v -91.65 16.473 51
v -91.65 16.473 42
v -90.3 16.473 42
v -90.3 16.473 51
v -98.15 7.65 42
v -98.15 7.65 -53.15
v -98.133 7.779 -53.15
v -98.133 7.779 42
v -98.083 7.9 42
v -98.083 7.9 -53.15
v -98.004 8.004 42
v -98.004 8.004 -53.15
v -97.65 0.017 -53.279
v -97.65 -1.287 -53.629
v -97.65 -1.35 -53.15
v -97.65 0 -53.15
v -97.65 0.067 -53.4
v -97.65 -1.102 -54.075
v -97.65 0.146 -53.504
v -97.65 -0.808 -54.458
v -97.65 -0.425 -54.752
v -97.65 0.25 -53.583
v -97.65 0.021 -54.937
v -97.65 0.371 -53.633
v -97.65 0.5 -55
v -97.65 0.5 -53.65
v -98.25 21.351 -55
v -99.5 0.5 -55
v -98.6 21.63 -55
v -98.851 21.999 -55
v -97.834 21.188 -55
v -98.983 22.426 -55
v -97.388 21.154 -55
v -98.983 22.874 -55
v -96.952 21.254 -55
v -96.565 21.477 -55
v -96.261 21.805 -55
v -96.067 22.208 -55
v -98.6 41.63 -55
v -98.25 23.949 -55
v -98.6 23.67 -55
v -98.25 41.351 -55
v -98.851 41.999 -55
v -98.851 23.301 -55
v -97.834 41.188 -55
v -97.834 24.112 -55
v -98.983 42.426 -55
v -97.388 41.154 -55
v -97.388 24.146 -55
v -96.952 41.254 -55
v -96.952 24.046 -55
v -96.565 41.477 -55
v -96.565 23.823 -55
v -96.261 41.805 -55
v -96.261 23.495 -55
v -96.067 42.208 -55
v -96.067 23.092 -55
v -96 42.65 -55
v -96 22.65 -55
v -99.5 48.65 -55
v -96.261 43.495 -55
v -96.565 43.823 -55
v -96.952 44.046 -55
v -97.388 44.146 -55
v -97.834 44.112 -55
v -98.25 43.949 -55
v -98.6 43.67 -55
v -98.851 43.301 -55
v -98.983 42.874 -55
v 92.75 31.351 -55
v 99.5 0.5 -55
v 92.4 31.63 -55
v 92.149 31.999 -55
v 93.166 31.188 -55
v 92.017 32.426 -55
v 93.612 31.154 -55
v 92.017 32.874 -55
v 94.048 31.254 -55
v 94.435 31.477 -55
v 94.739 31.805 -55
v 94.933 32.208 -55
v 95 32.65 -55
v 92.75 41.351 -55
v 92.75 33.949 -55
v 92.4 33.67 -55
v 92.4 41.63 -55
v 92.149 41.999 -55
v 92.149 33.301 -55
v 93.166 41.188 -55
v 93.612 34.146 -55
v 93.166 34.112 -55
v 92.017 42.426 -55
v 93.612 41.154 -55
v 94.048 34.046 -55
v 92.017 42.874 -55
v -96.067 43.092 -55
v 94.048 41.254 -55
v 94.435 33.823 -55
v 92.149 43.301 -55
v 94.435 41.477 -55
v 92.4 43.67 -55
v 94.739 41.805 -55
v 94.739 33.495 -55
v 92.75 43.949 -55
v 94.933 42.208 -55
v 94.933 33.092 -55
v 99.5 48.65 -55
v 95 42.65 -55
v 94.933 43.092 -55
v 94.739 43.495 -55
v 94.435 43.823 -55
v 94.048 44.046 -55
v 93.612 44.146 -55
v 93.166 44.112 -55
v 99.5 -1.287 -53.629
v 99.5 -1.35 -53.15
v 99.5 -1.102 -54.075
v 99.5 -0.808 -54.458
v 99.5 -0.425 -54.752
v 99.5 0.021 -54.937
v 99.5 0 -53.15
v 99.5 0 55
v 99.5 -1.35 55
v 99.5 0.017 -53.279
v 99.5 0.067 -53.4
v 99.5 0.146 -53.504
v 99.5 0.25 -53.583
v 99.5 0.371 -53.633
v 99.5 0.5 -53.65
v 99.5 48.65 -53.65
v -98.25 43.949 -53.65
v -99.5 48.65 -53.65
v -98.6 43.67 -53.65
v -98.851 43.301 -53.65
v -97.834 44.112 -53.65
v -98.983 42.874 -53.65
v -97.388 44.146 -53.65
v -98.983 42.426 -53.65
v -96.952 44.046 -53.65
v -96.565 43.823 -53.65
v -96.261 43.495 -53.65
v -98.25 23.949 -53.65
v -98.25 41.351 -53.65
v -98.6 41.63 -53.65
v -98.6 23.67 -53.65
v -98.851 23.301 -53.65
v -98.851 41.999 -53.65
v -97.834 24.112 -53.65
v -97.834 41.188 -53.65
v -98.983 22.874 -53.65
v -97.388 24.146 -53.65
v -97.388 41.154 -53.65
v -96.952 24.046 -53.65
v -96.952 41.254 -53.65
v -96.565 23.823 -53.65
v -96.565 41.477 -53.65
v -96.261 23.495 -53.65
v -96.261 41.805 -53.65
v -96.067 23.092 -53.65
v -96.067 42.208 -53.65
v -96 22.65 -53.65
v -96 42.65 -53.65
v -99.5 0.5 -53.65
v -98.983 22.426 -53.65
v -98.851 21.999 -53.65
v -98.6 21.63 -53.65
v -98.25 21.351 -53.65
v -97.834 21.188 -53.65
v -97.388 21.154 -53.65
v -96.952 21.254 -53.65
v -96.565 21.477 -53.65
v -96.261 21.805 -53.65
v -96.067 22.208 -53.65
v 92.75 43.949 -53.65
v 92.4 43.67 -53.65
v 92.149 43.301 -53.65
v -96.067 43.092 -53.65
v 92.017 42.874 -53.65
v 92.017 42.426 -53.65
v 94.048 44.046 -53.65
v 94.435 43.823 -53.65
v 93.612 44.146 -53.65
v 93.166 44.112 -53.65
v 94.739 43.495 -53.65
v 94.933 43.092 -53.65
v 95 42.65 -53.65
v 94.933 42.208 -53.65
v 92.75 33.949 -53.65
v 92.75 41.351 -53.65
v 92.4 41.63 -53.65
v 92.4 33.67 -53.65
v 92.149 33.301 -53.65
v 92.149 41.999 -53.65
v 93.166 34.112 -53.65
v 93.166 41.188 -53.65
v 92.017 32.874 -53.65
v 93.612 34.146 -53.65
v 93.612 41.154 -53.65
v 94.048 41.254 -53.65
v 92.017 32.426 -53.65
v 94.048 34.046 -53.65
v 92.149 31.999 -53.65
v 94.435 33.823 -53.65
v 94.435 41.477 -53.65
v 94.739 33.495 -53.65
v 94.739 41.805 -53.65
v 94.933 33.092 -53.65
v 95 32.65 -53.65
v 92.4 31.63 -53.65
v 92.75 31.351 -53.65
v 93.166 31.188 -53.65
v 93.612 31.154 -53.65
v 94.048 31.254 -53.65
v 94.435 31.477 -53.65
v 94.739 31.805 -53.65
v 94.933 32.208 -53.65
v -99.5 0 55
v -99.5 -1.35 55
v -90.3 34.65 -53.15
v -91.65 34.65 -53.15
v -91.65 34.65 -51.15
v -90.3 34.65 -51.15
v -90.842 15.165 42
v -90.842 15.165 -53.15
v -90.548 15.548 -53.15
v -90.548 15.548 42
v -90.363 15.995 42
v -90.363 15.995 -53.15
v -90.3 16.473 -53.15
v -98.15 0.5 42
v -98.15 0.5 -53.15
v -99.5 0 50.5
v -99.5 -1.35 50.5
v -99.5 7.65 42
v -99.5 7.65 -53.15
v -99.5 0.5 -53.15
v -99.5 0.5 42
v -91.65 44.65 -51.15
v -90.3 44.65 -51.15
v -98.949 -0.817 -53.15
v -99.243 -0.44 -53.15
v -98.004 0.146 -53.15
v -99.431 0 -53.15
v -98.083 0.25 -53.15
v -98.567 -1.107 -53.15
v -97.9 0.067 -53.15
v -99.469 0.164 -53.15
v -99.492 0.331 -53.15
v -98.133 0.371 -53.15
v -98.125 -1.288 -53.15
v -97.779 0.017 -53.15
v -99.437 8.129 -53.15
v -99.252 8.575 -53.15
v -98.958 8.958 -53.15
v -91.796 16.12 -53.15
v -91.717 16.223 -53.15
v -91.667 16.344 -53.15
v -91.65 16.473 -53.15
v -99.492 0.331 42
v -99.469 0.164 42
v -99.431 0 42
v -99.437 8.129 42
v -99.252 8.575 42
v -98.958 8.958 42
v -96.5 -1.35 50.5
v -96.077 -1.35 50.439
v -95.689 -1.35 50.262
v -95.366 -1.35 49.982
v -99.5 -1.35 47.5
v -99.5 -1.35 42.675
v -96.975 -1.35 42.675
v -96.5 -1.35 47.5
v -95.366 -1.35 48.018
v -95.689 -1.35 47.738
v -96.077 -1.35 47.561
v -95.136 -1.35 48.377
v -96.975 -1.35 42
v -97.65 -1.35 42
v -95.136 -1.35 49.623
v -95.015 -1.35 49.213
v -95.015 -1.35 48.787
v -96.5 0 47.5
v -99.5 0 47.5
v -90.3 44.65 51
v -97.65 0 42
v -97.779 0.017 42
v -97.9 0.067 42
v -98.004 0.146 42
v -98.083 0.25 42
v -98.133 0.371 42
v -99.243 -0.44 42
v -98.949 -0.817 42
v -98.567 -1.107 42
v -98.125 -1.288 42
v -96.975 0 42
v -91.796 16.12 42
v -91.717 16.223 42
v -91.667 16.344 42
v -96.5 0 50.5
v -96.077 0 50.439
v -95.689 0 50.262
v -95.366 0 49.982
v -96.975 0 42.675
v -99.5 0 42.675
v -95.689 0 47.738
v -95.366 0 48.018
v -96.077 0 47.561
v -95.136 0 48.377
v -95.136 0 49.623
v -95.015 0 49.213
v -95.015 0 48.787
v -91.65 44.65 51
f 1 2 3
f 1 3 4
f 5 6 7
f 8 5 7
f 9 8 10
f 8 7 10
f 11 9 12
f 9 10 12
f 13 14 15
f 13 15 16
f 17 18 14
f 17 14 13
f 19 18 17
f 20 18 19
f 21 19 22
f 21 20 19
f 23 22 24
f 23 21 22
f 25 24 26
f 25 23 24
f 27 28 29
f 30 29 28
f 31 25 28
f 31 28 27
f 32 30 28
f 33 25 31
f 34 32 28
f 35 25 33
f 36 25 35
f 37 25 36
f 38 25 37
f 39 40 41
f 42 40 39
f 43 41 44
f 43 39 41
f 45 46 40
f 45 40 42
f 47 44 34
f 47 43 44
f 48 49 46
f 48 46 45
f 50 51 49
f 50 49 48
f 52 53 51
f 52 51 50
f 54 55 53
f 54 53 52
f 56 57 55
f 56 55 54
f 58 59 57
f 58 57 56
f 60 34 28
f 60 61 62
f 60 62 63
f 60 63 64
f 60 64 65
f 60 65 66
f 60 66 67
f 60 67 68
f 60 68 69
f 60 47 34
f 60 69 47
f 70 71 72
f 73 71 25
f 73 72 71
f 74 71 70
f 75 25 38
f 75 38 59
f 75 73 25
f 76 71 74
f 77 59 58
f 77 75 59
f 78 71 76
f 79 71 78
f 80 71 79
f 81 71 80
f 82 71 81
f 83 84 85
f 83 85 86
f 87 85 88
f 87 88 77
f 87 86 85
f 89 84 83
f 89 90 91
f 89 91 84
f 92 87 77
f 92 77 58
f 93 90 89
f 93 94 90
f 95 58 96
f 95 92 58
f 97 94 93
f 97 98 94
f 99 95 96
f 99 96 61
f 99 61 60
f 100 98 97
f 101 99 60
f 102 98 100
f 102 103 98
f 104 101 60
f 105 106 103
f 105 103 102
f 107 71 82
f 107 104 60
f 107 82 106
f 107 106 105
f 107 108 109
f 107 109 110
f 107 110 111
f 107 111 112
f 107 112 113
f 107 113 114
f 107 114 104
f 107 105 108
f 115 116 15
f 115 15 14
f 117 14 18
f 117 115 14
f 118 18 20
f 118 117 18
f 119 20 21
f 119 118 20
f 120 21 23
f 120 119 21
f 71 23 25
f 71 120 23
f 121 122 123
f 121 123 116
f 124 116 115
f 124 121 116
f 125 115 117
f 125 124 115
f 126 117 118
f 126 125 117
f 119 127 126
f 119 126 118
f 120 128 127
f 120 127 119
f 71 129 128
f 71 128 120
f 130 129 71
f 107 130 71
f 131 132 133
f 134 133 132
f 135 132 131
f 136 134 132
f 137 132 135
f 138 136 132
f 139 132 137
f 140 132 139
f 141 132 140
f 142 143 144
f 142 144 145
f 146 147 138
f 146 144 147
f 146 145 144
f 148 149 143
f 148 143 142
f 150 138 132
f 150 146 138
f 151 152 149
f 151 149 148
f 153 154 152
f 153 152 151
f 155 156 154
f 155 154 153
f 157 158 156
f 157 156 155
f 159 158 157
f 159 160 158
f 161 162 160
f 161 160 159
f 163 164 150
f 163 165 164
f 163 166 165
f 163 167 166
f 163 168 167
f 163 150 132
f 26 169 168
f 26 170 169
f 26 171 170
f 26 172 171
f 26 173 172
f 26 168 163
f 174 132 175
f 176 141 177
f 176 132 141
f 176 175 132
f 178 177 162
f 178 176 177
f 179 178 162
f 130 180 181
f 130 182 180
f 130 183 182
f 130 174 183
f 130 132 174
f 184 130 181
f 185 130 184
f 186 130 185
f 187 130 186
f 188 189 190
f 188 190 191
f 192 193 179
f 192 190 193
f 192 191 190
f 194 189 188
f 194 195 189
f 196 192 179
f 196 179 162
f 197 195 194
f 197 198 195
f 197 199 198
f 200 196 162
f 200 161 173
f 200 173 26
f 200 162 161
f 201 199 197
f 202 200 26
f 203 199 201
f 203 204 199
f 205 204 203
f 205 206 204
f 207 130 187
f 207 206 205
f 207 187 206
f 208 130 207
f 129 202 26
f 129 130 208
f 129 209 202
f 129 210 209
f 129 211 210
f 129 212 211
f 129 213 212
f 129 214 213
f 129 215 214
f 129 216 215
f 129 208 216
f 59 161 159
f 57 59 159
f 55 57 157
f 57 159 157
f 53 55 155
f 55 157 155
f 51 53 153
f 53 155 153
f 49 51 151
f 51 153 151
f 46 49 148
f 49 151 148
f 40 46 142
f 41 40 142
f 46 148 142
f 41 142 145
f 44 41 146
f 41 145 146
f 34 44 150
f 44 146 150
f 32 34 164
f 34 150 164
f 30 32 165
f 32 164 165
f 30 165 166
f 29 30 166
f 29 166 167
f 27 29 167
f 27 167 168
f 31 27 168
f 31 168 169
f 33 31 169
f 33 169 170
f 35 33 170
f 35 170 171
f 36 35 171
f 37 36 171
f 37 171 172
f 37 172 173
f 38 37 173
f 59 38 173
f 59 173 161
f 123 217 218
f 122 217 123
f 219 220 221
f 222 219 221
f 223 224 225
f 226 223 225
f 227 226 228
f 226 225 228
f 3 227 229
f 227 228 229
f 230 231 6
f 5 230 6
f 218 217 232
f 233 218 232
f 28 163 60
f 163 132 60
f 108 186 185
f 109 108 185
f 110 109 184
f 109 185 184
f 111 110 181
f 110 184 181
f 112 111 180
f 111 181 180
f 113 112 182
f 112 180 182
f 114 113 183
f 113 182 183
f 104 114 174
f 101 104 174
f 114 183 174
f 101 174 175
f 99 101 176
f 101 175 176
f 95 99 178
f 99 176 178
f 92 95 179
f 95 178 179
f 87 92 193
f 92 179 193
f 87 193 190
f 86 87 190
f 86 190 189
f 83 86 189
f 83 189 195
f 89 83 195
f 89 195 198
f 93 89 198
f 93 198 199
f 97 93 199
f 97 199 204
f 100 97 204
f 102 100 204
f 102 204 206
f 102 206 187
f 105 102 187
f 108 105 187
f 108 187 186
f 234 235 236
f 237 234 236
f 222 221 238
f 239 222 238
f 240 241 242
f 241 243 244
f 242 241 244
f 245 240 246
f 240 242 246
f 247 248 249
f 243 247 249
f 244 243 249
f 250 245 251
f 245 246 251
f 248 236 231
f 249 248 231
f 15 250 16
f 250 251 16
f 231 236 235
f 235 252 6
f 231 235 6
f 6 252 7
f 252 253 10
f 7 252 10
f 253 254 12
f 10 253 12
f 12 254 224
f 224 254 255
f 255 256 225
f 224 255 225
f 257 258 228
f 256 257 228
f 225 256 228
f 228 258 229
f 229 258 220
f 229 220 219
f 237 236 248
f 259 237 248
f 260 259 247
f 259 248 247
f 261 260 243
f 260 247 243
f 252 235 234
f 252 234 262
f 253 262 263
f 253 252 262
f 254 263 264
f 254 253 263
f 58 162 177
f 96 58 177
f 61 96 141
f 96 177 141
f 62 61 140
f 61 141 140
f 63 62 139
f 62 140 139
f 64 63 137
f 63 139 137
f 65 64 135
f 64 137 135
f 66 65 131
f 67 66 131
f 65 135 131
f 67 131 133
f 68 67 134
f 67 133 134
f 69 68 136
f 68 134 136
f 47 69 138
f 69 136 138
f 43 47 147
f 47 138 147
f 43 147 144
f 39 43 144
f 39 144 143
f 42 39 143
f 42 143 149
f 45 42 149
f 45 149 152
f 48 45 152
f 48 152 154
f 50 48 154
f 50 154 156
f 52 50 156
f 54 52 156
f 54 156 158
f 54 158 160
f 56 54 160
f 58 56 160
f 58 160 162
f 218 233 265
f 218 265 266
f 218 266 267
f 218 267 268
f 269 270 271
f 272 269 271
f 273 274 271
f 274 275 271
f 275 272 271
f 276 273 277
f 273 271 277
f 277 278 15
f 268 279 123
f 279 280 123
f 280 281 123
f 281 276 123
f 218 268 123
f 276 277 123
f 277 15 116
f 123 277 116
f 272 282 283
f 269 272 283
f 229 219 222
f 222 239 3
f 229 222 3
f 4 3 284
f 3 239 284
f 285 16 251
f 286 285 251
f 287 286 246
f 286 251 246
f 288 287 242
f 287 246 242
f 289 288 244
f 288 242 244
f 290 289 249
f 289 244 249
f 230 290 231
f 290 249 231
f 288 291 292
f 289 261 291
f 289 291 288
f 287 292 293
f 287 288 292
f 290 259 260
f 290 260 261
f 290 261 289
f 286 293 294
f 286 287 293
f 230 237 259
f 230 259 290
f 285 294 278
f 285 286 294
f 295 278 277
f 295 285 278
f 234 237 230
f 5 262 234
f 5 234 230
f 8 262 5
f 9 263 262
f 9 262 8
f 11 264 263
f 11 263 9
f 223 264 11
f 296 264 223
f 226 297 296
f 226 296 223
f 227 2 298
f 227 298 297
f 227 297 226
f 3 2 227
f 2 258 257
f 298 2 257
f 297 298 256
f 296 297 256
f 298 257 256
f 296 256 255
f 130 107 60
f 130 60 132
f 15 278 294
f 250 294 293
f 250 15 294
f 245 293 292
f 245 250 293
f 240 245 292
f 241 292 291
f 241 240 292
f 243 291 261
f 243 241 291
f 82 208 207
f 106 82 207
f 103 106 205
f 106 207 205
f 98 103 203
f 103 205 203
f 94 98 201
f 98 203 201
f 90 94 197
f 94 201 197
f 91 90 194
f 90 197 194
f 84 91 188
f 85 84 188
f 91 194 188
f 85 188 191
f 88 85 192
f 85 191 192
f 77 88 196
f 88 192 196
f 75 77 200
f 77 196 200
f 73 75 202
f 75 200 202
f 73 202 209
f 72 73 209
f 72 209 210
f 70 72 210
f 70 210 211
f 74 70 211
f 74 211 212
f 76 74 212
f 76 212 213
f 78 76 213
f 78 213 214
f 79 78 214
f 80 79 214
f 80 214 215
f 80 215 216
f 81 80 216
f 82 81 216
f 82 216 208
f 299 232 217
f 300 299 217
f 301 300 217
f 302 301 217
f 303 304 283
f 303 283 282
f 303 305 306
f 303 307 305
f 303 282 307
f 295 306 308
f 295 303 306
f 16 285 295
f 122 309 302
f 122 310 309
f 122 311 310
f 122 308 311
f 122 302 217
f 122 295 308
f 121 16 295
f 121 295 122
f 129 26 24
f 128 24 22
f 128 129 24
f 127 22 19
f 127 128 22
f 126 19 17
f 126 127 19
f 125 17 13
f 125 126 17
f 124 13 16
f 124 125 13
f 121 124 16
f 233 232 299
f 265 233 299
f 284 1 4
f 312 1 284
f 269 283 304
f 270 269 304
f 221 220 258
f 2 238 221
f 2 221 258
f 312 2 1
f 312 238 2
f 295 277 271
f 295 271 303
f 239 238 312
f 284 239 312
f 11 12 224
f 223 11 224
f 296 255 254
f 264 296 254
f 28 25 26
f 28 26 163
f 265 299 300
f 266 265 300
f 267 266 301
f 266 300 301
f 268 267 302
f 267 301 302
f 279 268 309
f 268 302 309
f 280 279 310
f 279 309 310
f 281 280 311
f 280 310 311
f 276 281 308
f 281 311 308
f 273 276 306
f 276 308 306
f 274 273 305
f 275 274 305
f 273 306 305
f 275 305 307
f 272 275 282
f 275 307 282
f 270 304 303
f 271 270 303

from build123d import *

# Parameters (mm, degrees)
SKETCH1_W                    = 199
SKETCH1_H                    = 110
BASE_FLANGE1_DEPTH           = 1.35
EDGE_FLANGE1_STRIP_W         = 6.4
EDGE_FLANGE1_STRIP_H         = 1.35
EDGE_FLANGE1_STRIP_CUT_DEPTH = 199
EDGE_FLANGE1_DEPTH           = 199
EDGE_FLANGE2_START           = -55
EDGE_FLANGE2_DEPTH           = 97.675
EDGE_FLANGE2_2_DEPTH         = 1.85
EDGE_FLANGE2_START_2         = 42
EDGE_FLANGE2_3_DEPTH         = 0.675
EDGE_FLANGE2_START_3         = -53.15
EDGE_FLANGE2_4_DEPTH         = 95.15
JOG1_START                   = -53.15
JOG1_DEPTH                   = 95.15
JOG1_2_DEPTH                 = 95.15
SKETCH13_W                   = 2
SKETCH13_H                   = 10
CUT_EXTRUDE1_DEPTH           = 10
SKETCH15_R                   = 1.5
CUT_EXTRUDE2_DEPTH           = 10
SKETCH31_W                   = 9
SKETCH31_H                   = 28.176598128
BOSS_EXTRUDE2_DEPTH          = 1.35
CUT_EXTRUDE3_DEPTH           = 124.661119597


# Read off the part's stored shape, not the designer's step: Edge-Flange2, Jog1
# Sheet-metal steps are written as plain solids
with BuildPart() as part:
    # Sketch1 → Base-Flange1 (new body)
    with BuildSketch(Plane(origin=(0, 0, 0), x_dir=(1, 0, 0), z_dir=(0, 1, 0))):
        Rectangle(SKETCH1_W, SKETCH1_H)
    extrude(amount=-BASE_FLANGE1_DEPTH)

    # Edge-Flange1 strip (across the edge) → Edge-Flange1 strip cut (cut)
    with BuildSketch(Plane(origin=(99.5, 0, -55), x_dir=(0, 0, 1), z_dir=(-1, 0, 0))):
        with Locations((-1.35, -0.675)):
            Rectangle(EDGE_FLANGE1_STRIP_W, EDGE_FLANGE1_STRIP_H)
    extrude(amount=EDGE_FLANGE1_STRIP_CUT_DEPTH, mode=Mode.SUBTRACT)

    # Edge-Flange1 section (across the edge) → Edge-Flange1 (add)
    with BuildSketch(Plane(origin=(99.5, 0, -55), x_dir=(0, 0, 1), z_dir=(-1, 0, 0))):
        with BuildLine():
            Line((0, 0.5), (0, 48.65))
            Line((0, 48.65), (1.35, 48.65))
            Line((1.35, 48.65), (1.35, 0.5))
            ThreePointArc((1.35, 0.5), (1.496446609, 0.146446609), (1.85, 0))
            Line((1.85, 0), (1.85, -1.35))
            ThreePointArc((1.85, -1.35), (0.541852455, -0.808147545), (0, 0.5))
        make_face()
    extrude(amount=EDGE_FLANGE1_DEPTH)

    # Edge-Flange2 outline → Edge-Flange2 (cut)
    with BuildSketch(Plane.XY.offset(EDGE_FLANGE2_START)):
        with BuildLine():
            Line((-97.65, 0), (-97.65, 0.5))
            Line((-97.65, 0.5), (-98.15, 0.5))
            ThreePointArc((-98.15, 0.5), (-98.003553391, 0.146446609), (-97.65, 0))
        make_face()
        with BuildLine():
            Line((-99.5, 0.5), (-99.5, -1.35))
            Line((-99.5, -1.35), (-97.65, -1.35))
            ThreePointArc((-97.65, -1.35), (-98.958147545, -0.808147545), (-99.5, 0.5))
        make_face()
    extrude(amount=EDGE_FLANGE2_DEPTH, mode=Mode.SUBTRACT)

    # Edge-Flange2 2 outline → Edge-Flange2 2 (cut)
    with BuildSketch(Plane.XY.offset(EDGE_FLANGE2_START)):
        with BuildLine():
            ThreePointArc((-97.65, 0), (-98.003553391, 0.146446609), (-98.15, 0.5))
            Line((-98.15, 0.5), (-99.5, 0.5))
            ThreePointArc((-99.5, 0.5), (-98.958147545, -0.808147545), (-97.65, -1.35))
            Line((-97.65, -1.35), (-97.65, 0))
        make_face()
    extrude(amount=EDGE_FLANGE2_2_DEPTH, mode=Mode.SUBTRACT)

    # Edge-Flange2 3 outline → Edge-Flange2 3 (cut)
    with BuildSketch(Plane.XY.offset(EDGE_FLANGE2_START_2)):
        with BuildLine():
            Line((-96.975, 0), (-99.431151313, 0))
            ThreePointArc((-99.431151313, 0), (-98.767474832, -0.97436427), (-97.65, -1.35))
            Line((-97.65, -1.35), (-96.975, -1.35))
            Line((-96.975, -1.35), (-96.975, 0))
        make_face()
    extrude(amount=EDGE_FLANGE2_3_DEPTH, mode=Mode.SUBTRACT)

    # Edge-Flange2 4 outline → Edge-Flange2 4 (add)
    with BuildSketch(Plane.XY.offset(EDGE_FLANGE2_START_3)):
        with BuildLine():
            ThreePointArc((-97.65, 0), (-98.003553391, 0.146446609), (-98.15, 0.5))
            Line((-98.15, 0.5), (-98.15, 44.65))
            Line((-98.15, 44.65), (-99.5, 44.65))
            Line((-99.5, 44.65), (-99.5, 0.5))
            ThreePointArc((-99.5, 0.5), (-99.482707004, 0.247641058), (-99.431151313, 0))
            Line((-99.431151313, 0), (-97.65, 0))
        make_face()
    extrude(amount=EDGE_FLANGE2_4_DEPTH)

    # Jog1 outline → Jog1 (cut)
    with BuildSketch(Plane.XY.offset(JOG1_START)):
        with BuildLine():
            Line((-99.5, 44.65), (-99.5, 7.65))
            ThreePointArc((-99.5, 7.65), (-99.359177135, 8.35796435), (-98.958147545, 8.958147545))
            Line((-98.958147545, 8.958147545), (-98.15, 9.76629509))
            Line((-98.15, 9.76629509), (-98.15, 44.65))
            Line((-98.15, 44.65), (-99.5, 44.65))
        make_face()
    extrude(amount=JOG1_DEPTH, mode=Mode.SUBTRACT)

    # Jog1 2 outline → Jog1 2 (add)
    with BuildSketch(Plane.XY.offset(JOG1_START)):
        with BuildLine():
            Line((-91.796446609, 16.119848481), (-98.15, 9.76629509))
            Line((-98.15, 9.76629509), (-98.15, 7.65))
            ThreePointArc((-98.15, 7.65), (-98.111939766, 7.841341716), (-98.003553391, 8.003553391))
            Line((-98.003553391, 8.003553391), (-90.841852455, 15.165254326))
            ThreePointArc((-90.841852455, 15.165254326), (-90.440822865, 15.765437522), (-90.3, 16.473401872))
            Line((-90.3, 16.473401872), (-90.3, 44.65))
            Line((-90.3, 44.65), (-91.65, 44.65))
            Line((-91.65, 44.65), (-91.65, 16.473401872))
            ThreePointArc((-91.65, 16.473401872), (-91.688060234, 16.282060156), (-91.796446609, 16.119848481))
        make_face()
    extrude(amount=JOG1_2_DEPTH)

    # Sketch13 → Cut-Extrude1 (cut)
    with BuildSketch(Plane.ZY.offset(99.5)):
        with Locations((-52.15, 39.65)):
            Rectangle(SKETCH13_W, SKETCH13_H)
    extrude(amount=-CUT_EXTRUDE1_DEPTH, mode=Mode.SUBTRACT)

    # Sketch15 → Cut-Extrude2 (cut)
    with BuildSketch(Plane.XY.offset(-53.65)):
        with Locations((-97.5, 42.65)):
            Circle(SKETCH15_R)
        with Locations((-97.5, 22.65)):
            Circle(SKETCH15_R)
        with Locations((93.5, 42.65)):
            Circle(SKETCH15_R)
        with Locations((93.5, 32.65)):
            Circle(SKETCH15_R)
    extrude(amount=-CUT_EXTRUDE2_DEPTH, mode=Mode.SUBTRACT)

    # Sketch31 → Boss-Extrude2 (add)
    with BuildSketch(Plane.ZY.offset(91.65)):
        with Locations((46.5, 30.561700936)):
            Rectangle(SKETCH31_W, SKETCH31_H)
    extrude(amount=-BOSS_EXTRUDE2_DEPTH)

    # Sketch16 → Cut-Extrude3 (cut, through all)
    with BuildSketch(Plane(origin=(0, 0, 0), x_dir=(1, 0, 0), z_dir=(0, 1, 0))):
        with BuildLine():
            Line((-96.5, -47.5), (-99.5, -47.5))
            Line((-99.5, -47.5), (-99.5, -50.5))
            Line((-99.5, -50.5), (-96.5, -50.5))
            ThreePointArc((-96.5, -50.5), (-95, -49), (-96.5, -47.5))
        make_face()
    extrude(amount=-CUT_EXTRUDE3_DEPTH, mode=Mode.SUBTRACT)


solid = part.part
